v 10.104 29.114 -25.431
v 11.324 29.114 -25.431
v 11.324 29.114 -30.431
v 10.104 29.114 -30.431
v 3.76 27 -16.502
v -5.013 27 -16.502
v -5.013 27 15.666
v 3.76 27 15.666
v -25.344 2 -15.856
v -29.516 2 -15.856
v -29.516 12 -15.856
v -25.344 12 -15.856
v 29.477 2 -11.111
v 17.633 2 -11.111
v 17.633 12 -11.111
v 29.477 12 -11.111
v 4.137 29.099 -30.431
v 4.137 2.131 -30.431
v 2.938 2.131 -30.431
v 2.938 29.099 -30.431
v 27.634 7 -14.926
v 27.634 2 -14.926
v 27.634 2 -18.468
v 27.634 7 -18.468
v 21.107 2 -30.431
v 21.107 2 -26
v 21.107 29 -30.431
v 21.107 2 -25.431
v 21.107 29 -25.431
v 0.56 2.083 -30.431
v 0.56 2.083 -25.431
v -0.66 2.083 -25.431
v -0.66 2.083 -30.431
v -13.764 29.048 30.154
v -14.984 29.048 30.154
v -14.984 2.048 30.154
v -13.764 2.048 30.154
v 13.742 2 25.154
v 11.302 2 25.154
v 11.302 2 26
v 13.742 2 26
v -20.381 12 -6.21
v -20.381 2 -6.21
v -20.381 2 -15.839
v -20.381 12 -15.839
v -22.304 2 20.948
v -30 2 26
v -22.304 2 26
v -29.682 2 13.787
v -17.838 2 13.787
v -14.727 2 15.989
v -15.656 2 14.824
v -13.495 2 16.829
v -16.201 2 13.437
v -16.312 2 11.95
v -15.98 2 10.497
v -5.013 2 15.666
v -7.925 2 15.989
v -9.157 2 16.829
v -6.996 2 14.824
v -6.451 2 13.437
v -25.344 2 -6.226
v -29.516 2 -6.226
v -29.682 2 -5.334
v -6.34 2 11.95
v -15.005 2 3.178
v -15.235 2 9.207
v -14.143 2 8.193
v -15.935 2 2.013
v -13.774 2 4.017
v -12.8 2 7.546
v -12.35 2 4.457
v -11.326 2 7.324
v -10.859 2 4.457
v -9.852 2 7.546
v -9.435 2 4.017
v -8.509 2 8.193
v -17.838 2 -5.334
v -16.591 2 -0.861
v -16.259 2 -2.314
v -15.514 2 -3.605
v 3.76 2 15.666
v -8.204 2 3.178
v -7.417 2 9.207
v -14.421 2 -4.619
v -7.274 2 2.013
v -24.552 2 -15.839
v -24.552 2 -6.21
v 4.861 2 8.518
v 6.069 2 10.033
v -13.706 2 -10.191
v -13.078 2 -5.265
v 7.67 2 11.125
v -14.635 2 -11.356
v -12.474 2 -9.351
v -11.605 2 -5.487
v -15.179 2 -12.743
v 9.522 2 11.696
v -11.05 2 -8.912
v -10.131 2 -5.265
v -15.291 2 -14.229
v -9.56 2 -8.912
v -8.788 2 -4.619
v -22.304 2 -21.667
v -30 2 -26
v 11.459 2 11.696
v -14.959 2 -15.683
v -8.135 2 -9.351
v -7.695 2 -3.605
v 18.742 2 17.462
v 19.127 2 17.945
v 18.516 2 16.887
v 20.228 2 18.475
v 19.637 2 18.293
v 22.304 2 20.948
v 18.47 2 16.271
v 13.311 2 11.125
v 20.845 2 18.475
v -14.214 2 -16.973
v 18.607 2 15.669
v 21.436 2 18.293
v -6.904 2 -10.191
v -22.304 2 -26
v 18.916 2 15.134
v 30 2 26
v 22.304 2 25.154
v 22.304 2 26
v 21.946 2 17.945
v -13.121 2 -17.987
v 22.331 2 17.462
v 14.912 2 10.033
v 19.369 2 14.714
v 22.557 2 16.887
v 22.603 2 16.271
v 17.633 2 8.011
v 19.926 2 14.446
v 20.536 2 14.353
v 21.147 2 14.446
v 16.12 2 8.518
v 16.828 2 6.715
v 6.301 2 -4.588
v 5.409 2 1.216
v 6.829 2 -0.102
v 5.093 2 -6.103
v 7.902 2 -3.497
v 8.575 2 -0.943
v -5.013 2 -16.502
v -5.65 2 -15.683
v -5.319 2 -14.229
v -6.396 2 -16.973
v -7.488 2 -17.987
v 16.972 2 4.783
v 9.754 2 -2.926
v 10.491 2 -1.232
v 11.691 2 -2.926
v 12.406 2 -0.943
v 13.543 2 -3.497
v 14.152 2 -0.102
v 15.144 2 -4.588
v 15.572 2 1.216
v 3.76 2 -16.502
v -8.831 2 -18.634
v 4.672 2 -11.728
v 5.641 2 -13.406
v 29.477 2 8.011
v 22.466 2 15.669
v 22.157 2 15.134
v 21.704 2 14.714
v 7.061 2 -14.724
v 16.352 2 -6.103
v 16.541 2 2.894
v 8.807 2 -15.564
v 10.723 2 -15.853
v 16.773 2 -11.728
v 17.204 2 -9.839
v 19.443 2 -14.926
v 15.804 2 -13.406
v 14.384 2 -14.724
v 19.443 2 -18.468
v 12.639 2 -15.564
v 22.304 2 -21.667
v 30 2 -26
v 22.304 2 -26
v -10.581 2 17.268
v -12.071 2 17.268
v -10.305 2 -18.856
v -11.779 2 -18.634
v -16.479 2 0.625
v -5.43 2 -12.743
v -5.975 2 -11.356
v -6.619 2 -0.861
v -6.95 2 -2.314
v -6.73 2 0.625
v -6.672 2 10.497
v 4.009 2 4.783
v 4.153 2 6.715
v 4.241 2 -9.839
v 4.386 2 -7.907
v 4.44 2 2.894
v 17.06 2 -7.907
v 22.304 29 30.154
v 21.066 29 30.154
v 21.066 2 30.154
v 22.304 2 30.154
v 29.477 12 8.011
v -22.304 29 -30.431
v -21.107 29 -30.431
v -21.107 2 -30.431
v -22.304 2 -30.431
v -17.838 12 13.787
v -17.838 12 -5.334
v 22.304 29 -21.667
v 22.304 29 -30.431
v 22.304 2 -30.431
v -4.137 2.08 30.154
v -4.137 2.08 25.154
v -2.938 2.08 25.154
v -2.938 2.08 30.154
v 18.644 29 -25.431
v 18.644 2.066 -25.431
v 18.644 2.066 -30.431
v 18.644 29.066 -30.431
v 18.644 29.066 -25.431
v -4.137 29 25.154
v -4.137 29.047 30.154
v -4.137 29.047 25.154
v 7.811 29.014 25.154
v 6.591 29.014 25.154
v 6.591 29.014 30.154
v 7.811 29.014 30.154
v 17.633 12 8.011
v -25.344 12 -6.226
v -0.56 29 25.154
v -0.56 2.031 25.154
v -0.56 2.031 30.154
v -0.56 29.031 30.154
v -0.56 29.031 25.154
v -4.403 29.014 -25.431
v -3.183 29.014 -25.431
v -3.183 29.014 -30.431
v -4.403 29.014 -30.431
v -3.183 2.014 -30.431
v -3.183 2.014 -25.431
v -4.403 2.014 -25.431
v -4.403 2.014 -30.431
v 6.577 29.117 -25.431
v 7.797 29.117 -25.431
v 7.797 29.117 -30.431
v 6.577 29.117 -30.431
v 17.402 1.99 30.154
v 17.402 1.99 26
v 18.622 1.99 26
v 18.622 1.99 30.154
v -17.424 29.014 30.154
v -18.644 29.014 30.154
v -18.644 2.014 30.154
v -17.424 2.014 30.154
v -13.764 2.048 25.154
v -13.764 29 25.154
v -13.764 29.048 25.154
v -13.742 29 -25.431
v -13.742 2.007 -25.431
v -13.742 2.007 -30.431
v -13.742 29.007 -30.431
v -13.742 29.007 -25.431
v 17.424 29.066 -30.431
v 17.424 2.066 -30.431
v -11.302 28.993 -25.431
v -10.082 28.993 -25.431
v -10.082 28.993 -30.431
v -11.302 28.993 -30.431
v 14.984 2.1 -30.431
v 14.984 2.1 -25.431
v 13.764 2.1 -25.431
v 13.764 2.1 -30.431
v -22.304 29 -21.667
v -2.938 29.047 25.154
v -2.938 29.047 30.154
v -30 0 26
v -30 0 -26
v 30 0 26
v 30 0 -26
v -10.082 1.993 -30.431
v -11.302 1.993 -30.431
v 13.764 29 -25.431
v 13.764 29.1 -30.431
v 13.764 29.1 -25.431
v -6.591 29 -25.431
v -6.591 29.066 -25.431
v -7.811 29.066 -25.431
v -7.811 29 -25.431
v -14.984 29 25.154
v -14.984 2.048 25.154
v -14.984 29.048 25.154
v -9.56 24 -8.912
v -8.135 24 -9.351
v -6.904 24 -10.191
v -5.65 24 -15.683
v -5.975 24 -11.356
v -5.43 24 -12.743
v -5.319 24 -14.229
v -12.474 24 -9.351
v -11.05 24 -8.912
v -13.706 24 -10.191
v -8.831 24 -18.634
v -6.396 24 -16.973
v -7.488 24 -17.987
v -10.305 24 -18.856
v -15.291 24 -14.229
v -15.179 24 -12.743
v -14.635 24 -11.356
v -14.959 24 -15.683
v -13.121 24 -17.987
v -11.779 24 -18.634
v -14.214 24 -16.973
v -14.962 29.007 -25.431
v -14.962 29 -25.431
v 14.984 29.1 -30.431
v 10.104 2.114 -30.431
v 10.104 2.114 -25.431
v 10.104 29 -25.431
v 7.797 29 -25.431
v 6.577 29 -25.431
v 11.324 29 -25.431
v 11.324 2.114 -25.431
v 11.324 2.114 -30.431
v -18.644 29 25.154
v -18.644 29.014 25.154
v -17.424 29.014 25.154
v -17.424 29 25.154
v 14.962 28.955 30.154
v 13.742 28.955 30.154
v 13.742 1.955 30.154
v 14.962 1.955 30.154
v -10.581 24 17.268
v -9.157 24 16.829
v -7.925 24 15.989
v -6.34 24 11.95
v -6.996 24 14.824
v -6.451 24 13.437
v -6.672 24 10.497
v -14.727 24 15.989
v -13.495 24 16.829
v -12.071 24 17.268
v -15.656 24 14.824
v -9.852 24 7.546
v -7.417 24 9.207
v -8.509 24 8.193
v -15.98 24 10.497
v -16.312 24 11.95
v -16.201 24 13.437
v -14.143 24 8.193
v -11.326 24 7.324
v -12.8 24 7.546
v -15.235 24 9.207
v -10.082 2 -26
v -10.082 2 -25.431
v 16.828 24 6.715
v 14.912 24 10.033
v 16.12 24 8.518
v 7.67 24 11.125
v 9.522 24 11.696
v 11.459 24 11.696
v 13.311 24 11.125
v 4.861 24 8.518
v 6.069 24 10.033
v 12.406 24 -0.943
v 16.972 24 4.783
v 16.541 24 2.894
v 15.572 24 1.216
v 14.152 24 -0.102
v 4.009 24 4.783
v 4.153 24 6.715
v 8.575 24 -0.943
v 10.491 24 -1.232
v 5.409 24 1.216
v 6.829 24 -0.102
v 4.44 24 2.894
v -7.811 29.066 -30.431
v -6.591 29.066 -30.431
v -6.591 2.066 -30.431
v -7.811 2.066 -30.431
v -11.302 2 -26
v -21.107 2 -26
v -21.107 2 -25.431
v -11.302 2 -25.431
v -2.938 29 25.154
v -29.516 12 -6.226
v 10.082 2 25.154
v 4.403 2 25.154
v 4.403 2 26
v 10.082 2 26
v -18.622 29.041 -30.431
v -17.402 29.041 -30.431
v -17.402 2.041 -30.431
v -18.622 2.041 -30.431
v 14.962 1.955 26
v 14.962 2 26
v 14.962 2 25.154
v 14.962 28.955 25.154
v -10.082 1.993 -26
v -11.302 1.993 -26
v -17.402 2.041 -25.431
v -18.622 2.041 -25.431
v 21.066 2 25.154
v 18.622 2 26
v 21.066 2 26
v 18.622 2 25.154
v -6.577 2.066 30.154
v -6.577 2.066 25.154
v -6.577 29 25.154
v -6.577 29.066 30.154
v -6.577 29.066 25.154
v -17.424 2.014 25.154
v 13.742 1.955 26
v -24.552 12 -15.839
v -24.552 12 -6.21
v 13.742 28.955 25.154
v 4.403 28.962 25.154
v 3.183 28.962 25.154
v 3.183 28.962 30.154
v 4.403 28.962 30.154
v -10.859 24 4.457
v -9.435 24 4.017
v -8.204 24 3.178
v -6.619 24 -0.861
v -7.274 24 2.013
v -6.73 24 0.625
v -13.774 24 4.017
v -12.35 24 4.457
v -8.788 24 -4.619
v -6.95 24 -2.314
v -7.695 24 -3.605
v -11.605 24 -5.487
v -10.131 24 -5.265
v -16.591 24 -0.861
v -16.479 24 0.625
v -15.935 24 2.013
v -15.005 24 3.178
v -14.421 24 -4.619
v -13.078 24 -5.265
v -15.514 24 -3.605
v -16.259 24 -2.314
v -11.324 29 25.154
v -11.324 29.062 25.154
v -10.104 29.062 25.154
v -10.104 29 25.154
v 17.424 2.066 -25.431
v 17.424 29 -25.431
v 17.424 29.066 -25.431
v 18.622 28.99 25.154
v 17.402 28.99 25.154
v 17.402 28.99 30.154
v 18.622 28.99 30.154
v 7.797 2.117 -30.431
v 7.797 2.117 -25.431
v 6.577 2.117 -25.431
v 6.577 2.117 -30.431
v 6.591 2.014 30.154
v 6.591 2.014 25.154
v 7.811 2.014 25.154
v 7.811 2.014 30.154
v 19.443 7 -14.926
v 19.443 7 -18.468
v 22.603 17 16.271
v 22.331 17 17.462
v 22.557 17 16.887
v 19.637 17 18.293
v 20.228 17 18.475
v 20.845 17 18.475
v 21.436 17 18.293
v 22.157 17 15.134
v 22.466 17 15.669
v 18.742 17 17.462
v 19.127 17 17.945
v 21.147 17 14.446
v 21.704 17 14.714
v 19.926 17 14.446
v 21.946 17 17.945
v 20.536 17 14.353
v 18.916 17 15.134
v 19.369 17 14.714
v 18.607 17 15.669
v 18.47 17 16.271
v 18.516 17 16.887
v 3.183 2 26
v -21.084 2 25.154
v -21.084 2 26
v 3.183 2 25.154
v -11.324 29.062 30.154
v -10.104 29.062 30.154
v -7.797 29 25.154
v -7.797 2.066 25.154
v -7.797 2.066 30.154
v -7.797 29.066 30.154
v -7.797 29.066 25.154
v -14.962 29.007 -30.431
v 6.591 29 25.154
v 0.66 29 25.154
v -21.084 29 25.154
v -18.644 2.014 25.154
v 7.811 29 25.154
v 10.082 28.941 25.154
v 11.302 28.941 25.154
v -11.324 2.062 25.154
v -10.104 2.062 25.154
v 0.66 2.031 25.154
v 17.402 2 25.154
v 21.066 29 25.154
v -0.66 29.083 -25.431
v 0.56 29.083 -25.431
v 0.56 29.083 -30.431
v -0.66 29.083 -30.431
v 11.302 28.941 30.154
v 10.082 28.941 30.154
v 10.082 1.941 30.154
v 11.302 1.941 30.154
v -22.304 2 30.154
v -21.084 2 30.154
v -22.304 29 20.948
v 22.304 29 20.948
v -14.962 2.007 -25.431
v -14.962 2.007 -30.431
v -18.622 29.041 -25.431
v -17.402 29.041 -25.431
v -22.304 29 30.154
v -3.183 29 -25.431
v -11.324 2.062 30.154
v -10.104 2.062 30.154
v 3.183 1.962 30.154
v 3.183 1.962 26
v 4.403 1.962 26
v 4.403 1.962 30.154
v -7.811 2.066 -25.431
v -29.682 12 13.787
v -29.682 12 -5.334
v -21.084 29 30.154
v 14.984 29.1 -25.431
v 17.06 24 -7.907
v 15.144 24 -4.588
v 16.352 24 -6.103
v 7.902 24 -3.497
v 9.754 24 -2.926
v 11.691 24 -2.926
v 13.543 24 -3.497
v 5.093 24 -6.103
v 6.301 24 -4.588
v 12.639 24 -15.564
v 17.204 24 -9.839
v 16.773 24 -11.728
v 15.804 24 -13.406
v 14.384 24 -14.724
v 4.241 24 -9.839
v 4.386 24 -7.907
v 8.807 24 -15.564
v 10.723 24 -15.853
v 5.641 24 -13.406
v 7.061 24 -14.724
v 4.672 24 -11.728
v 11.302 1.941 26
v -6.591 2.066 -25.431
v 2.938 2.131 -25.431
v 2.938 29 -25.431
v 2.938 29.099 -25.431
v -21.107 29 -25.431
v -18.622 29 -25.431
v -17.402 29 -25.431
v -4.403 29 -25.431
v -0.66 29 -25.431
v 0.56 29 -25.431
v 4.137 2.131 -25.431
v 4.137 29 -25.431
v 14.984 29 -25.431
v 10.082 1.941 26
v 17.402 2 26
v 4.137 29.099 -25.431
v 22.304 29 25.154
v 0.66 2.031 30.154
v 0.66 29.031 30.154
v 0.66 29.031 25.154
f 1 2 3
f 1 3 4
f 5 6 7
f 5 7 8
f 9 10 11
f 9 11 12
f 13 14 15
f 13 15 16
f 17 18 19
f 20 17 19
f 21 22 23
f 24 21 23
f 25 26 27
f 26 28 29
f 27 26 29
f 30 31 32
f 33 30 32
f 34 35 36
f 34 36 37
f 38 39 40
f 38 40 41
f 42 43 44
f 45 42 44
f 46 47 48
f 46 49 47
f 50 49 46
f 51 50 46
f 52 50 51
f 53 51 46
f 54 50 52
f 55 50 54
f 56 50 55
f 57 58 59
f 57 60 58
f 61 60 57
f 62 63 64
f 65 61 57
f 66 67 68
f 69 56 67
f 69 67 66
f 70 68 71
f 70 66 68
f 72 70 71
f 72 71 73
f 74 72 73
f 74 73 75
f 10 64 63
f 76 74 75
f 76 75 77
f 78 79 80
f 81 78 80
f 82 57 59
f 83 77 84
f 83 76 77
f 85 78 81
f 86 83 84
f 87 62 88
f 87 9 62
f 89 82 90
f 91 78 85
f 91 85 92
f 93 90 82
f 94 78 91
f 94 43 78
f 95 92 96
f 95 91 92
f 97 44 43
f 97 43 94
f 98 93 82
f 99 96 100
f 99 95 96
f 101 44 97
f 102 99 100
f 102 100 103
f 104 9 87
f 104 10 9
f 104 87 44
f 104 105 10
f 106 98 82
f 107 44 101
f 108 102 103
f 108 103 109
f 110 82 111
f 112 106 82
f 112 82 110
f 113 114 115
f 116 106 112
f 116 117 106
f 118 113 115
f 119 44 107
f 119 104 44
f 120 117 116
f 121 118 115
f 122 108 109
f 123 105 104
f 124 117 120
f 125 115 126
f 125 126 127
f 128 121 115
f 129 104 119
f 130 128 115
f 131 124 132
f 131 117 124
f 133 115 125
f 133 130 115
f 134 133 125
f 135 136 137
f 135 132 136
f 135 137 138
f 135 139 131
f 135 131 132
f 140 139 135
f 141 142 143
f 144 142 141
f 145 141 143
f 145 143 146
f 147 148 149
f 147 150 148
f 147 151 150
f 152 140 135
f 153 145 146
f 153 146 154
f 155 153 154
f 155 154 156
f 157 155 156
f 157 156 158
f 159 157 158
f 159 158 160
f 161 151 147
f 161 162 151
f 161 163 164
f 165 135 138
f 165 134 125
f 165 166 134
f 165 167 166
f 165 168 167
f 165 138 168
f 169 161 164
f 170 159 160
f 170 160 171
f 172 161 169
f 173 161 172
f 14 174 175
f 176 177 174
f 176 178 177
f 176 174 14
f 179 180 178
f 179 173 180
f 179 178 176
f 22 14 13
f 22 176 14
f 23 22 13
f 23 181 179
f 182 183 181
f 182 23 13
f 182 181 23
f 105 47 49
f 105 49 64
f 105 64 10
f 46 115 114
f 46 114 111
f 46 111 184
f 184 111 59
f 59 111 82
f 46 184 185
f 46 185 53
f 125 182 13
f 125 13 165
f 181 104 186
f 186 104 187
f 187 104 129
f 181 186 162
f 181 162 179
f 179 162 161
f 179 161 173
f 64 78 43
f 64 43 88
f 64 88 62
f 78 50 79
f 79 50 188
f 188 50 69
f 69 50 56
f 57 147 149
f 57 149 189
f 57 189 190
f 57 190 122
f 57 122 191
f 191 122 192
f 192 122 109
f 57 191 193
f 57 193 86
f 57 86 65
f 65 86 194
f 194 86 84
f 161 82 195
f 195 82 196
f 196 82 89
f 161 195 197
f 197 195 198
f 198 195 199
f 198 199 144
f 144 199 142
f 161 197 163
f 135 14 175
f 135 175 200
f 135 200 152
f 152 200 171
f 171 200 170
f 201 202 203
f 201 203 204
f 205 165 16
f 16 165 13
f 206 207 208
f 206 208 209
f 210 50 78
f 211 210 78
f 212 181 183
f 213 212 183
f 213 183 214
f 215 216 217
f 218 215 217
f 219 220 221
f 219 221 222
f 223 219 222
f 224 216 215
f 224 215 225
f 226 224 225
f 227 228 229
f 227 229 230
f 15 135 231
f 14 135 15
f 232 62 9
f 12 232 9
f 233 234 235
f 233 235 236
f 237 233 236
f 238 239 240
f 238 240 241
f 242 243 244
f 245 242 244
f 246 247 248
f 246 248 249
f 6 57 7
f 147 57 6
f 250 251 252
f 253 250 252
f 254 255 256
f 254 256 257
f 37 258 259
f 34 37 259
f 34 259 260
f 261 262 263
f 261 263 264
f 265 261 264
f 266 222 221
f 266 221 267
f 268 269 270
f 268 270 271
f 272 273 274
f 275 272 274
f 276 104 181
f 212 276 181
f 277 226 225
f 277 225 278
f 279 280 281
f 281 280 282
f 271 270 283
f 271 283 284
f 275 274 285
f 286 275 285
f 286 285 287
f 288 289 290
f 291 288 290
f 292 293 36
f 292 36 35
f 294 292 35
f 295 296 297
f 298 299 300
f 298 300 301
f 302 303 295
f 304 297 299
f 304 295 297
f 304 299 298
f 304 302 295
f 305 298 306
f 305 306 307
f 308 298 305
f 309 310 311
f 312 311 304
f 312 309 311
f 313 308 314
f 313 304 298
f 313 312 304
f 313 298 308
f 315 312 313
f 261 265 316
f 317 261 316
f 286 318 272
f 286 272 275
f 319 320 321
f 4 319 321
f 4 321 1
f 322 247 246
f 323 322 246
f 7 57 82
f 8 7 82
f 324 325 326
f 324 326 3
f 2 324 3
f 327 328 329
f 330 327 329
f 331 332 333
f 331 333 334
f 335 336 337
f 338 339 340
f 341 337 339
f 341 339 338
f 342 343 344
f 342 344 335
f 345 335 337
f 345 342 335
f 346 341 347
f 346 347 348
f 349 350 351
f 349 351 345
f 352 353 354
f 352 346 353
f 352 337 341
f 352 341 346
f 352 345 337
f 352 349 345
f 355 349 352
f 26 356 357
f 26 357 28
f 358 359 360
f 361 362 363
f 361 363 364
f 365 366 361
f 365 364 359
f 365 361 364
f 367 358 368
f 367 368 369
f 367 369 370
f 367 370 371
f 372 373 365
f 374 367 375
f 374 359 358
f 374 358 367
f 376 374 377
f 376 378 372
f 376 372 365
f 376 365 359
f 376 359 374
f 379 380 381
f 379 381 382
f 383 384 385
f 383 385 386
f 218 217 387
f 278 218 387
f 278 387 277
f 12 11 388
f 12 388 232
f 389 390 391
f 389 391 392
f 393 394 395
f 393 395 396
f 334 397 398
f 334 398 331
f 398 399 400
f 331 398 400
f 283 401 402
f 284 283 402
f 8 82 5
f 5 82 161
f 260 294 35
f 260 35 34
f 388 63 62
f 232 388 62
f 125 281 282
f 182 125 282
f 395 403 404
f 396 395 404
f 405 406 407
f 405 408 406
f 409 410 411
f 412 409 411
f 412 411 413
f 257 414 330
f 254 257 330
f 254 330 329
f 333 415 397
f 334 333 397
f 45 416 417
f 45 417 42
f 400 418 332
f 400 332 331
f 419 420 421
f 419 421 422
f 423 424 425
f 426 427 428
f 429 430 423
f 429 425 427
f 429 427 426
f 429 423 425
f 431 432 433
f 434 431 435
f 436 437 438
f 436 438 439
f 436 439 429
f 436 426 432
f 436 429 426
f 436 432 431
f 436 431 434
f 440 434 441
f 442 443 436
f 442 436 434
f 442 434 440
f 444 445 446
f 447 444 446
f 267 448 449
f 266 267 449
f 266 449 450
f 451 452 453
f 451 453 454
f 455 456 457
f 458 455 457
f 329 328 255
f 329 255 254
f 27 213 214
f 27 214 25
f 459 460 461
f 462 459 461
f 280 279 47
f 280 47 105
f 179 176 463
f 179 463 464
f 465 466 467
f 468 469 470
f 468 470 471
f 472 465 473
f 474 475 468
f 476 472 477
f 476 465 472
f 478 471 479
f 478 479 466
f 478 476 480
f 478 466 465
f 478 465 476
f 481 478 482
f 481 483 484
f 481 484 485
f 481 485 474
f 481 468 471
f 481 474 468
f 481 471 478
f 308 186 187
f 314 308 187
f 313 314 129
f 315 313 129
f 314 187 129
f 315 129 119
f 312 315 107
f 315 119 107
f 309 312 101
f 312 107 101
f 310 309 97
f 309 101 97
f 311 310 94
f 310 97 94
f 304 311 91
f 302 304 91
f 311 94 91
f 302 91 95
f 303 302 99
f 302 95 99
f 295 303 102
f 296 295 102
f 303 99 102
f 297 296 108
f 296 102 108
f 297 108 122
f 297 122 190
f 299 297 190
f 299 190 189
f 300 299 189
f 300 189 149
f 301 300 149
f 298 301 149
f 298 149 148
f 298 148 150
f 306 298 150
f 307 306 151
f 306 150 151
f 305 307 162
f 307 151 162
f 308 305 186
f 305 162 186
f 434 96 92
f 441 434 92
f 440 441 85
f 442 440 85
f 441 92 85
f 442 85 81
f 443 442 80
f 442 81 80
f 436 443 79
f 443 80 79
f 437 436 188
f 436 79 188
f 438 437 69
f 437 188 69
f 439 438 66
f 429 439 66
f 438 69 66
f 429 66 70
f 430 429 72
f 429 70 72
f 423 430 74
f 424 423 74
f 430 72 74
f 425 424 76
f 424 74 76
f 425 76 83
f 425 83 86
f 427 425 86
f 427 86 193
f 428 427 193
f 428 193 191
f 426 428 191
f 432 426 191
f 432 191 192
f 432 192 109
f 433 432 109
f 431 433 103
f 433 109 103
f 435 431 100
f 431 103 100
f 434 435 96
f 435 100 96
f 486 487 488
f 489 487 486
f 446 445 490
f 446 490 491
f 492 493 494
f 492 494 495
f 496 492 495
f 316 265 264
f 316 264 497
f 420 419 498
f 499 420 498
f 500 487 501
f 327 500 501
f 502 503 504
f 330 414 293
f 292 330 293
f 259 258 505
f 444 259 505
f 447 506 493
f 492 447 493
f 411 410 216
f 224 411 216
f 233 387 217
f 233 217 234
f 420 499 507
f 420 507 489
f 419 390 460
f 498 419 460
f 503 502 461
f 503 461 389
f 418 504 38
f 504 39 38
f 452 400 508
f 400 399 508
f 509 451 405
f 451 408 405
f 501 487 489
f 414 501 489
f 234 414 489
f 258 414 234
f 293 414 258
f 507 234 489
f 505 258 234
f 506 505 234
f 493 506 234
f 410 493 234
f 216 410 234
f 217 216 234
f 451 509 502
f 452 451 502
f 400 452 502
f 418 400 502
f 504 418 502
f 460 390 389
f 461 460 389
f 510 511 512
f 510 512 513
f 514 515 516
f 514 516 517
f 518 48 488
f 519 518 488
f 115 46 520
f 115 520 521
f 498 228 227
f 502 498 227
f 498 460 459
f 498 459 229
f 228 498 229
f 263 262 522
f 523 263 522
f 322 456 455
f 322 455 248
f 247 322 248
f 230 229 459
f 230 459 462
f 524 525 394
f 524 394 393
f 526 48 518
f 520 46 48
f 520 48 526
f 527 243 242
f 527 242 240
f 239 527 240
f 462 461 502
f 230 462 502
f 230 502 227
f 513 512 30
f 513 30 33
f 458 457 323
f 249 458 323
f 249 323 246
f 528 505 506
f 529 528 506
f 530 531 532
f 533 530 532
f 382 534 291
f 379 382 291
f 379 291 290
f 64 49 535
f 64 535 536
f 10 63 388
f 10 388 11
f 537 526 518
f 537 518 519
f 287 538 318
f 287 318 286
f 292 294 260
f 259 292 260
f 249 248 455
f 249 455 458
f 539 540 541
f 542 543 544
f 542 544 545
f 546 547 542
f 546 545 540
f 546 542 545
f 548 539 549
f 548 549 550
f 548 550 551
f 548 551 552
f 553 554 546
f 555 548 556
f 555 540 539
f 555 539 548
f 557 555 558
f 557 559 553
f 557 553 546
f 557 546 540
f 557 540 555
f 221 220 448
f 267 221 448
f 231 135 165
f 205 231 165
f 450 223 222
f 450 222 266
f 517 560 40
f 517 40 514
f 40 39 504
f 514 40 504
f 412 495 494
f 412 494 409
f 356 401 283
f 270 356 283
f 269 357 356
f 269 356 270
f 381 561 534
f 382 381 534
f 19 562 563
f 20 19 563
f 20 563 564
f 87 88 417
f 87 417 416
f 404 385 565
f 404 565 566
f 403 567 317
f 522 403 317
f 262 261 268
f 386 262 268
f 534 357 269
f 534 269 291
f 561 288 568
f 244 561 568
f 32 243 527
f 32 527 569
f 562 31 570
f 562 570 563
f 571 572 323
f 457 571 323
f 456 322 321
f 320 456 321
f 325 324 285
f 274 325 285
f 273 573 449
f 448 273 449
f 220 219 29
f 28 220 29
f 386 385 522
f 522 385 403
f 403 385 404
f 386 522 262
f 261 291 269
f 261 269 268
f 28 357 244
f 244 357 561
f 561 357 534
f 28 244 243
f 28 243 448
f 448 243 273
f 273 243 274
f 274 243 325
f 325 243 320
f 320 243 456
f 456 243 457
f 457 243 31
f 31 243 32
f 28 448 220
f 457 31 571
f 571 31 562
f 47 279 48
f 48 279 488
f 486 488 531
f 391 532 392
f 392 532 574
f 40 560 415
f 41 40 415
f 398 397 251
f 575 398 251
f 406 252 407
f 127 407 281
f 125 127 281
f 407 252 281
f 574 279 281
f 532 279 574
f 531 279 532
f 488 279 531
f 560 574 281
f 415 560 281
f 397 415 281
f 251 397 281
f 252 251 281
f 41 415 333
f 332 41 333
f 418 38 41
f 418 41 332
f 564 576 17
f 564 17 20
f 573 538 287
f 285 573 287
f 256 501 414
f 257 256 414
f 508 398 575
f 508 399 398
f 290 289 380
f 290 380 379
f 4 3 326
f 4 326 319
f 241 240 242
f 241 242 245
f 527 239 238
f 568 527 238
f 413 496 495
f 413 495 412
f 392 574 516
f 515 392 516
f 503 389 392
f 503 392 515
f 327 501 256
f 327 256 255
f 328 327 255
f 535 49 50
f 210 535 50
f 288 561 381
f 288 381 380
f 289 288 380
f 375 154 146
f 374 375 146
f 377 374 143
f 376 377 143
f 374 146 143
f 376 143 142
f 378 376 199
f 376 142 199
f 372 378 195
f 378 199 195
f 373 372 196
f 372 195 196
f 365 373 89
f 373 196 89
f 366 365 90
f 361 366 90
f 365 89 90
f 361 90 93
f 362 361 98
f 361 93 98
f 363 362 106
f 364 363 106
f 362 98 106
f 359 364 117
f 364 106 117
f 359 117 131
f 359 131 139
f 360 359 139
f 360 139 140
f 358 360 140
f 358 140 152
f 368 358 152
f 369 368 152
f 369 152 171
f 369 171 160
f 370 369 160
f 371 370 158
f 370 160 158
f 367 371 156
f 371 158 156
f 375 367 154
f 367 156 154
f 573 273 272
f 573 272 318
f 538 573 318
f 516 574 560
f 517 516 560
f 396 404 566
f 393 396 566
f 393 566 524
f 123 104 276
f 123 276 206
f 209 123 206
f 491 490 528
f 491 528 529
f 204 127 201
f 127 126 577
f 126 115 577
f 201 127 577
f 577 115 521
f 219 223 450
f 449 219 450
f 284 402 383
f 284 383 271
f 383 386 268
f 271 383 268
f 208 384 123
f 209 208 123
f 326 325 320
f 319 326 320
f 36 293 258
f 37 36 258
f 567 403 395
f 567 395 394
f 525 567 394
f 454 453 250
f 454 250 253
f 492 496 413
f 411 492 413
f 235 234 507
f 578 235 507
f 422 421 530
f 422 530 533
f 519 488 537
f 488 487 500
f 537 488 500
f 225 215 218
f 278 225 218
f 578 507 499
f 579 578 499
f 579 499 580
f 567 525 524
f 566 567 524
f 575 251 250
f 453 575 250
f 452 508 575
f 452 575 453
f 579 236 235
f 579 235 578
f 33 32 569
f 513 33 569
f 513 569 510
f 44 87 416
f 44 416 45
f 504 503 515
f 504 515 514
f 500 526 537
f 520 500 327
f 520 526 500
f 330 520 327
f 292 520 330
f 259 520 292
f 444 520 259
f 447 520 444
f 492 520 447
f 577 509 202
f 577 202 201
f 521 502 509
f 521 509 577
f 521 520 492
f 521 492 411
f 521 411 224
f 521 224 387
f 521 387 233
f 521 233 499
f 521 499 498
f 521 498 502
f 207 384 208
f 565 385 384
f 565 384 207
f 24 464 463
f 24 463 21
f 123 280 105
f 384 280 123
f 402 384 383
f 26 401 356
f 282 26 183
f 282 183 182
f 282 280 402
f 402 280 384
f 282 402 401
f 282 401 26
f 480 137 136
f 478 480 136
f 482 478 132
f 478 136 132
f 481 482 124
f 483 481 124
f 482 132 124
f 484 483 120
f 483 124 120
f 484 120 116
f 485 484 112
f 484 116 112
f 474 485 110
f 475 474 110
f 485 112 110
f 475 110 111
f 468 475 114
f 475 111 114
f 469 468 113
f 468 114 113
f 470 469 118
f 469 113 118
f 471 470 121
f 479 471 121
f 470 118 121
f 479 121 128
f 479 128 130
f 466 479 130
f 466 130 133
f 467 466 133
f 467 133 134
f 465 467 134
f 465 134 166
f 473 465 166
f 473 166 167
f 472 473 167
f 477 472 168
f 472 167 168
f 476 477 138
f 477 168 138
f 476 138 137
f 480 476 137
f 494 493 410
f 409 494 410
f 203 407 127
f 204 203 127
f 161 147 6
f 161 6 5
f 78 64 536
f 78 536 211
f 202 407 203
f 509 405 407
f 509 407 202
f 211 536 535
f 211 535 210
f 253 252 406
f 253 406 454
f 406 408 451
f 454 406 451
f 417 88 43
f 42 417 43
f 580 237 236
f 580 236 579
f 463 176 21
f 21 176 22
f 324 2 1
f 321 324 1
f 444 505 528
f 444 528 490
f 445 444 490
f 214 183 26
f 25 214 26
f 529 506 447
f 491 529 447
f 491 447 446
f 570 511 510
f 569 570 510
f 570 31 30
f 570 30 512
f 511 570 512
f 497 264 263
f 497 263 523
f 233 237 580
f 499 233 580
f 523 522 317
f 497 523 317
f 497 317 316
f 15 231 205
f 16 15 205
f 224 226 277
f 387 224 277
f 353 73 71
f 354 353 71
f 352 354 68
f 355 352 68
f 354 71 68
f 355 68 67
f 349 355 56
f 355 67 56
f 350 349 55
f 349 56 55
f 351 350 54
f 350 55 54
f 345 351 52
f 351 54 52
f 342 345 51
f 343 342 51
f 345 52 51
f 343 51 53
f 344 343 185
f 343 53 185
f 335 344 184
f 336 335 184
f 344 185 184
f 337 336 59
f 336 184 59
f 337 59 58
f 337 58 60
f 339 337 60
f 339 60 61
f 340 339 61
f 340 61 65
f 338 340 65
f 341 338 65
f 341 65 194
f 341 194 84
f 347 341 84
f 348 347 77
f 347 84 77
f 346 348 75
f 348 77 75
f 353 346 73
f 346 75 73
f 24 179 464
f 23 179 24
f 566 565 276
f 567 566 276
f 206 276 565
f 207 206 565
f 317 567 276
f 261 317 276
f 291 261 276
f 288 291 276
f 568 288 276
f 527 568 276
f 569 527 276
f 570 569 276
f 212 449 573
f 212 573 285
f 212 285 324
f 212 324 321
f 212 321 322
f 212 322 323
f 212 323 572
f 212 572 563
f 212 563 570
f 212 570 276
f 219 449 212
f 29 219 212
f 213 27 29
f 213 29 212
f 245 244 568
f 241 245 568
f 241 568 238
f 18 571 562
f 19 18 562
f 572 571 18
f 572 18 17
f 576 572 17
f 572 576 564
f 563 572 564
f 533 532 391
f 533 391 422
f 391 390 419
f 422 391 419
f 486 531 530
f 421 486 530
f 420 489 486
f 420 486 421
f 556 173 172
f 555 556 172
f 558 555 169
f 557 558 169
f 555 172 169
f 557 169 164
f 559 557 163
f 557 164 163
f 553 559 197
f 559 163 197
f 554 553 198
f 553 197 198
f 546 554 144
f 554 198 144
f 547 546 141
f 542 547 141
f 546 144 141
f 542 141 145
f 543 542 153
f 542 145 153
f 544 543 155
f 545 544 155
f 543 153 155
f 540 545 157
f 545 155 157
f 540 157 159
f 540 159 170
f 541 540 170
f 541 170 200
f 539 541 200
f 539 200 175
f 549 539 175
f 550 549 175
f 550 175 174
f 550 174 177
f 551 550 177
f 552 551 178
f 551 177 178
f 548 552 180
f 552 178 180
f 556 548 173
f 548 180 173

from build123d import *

# Parameters (mm, degrees)
SKIZZE1_W                        = 60
SKIZZE1_H                        = 52
AUFSATZ_LINEAR_AUSTRAGEN1_DEPTH  = 2
SKIZZE2_W                        = 4.171328817
SKIZZE2_H                        = 9.629375294
SKIZZE2_H_2                      = 9.629375295
AUFSATZ_LINEAR_AUSTRAGEN2_DEPTH  = 10
SKIZZE3_W                        = 11.843772269
SKIZZE3_H                        = 19.121604294
SKIZZE3_H_2                      = 19.121604293
AUFSATZ_LINEAR_AUSTRAGEN3_DEPTH  = 10
SKIZZE4_R                        = 2.072288809
AUFSATZ_LINEAR_AUSTRAGEN4_DEPTH  = 15
SKIZZE5_W                        = 8.191020073
SKIZZE5_H                        = 3.542062735
AUFSATZ_LINEAR_AUSTRAGEN5_DEPTH  = 5
SKIZZE6_W                        = 44.607852562
SKIZZE6_H                        = 3.763441655
SKIZZE6_H_2                      = 4.206199497
AUFSATZ_LINEAR_AUSTRAGEN6_DEPTH  = 27
SKIZZE7_R                        = 5
SKIZZE7_R_2                      = 6.5
AUFSATZ_LINEAR_AUSTRAGEN7_DEPTH  = 22
SKIZZE8_W                        = 8.773032398
SKIZZE8_H                        = 32.167785459
AUFSATZ_LINEAR_AUSTRAGEN8_DEPTH  = 25
SKIZZE9_W                        = 1.22
SKIZZE9_H                        = 27
SKIZZE9_W_2                      = 1.198395349
SKIZZE9_H_2                      = 26.967916188
SKIZZE9_W_3                      = 1.238034023
AUFSATZ_LINEAR_AUSTRAGEN9_DEPTH  = 5
SKIZZE10_W                       = 1.22
SKIZZE10_H                       = 27
SKIZZE10_W_2                     = 1.198395349
SKIZZE10_H_2                     = 26.967916188
SKIZZE10_W_3                     = 1.196647202
AUFSATZ_LINEAR_AUSTRAGEN10_DEPTH = 5


with BuildPart() as part:
    # Skizze1 → Aufsatz-Linear austragen1 (new body)
    with BuildSketch(Plane(origin=(0, 0, 0), x_dir=(1, 0, 0), z_dir=(0, 1, 0))):
        Rectangle(SKIZZE1_W, SKIZZE1_H)
    extrude(amount=AUFSATZ_LINEAR_AUSTRAGEN1_DEPTH)

    # Skizze2 → Aufsatz-Linear austragen2 (add)
    with BuildSketch(Plane(origin=(0, 2, 0), x_dir=(1, 0, 0), z_dir=(0, 1, 0))):
        with Locations((-27.429980224, 11.040969798)):
            Rectangle(SKIZZE2_W, SKIZZE2_H)
        with Locations((-22.466389845, 11.024313198)):
            Rectangle(SKIZZE2_W, SKIZZE2_H_2)
    extrude(amount=AUFSATZ_LINEAR_AUSTRAGEN2_DEPTH)

    # Skizze3 → Aufsatz-Linear austragen3 (add)
    with BuildSketch(Plane(origin=(0, 2, 0), x_dir=(1, 0, 0), z_dir=(0, 1, 0))):
        with Locations((23.554785505, 1.549851865)):
            Rectangle(SKIZZE3_W, SKIZZE3_H)
        with Locations((-23.759716727, -4.226654643)):
            Rectangle(SKIZZE3_W, SKIZZE3_H_2)
    extrude(amount=AUFSATZ_LINEAR_AUSTRAGEN3_DEPTH)

    # Skizze4 → Aufsatz-Linear austragen4 (add)
    with BuildSketch(Plane(origin=(0, 2, 0), x_dir=(1, 0, 0), z_dir=(0, 1, 0))):
        with Locations(Location((20.536465542, -16.425780337, 0), (0, 0, 90))):
            Circle(SKIZZE4_R)
    extrude(amount=AUFSATZ_LINEAR_AUSTRAGEN4_DEPTH)

    # Skizze5 → Aufsatz-Linear austragen5 (add)
    with BuildSketch(Plane(origin=(0, 2, 0), x_dir=(1, 0, 0), z_dir=(0, 1, 0))):
        with Locations((23.538626636, 16.697381153)):
            Rectangle(SKIZZE5_W, SKIZZE5_H)
    extrude(amount=AUFSATZ_LINEAR_AUSTRAGEN5_DEPTH)

    # Skizze6 → Aufsatz-Linear austragen6 (add)
    with BuildSketch(Plane(origin=(0, 2, 0), x_dir=(1, 0, 0), z_dir=(0, 1, 0))):
        with Locations((0, 23.549182712)):
            Rectangle(SKIZZE6_W, SKIZZE6_H)
        with Locations((0, -23.05108014)):
            Rectangle(SKIZZE6_W, SKIZZE6_H_2)
    extrude(amount=AUFSATZ_LINEAR_AUSTRAGEN6_DEPTH)

    # Skizze7 → Aufsatz-Linear austragen7 (add)
    with BuildSketch(Plane(origin=(0, 2, 0), x_dir=(1, 0, 0), z_dir=(0, 1, 0))):
        with Locations(Location((-11.604540209, 0.487390689, 0), (0, 0, 90))):
            Circle(SKIZZE7_R)
        with Locations(Location((-10.304831705, 13.855821009, 0), (0, 0, 90))):
            Circle(SKIZZE7_R)
        with Locations(Location((-11.326031244, -12.324021702, 0), (0, 0, 90))):
            Circle(SKIZZE7_R)
        with Locations(Location((10.722595153, 9.353259408, 0), (0, 0, 90))):
            Circle(SKIZZE7_R_2)
        with Locations(Location((10.490504349, -5.268461255, 0), (0, 0, 90))):
            Circle(SKIZZE7_R_2)
    extrude(amount=AUFSATZ_LINEAR_AUSTRAGEN7_DEPTH)

    # Skizze8 → Aufsatz-Linear austragen8 (add)
    with BuildSketch(Plane(origin=(0, 2, 0), x_dir=(1, 0, 0), z_dir=(0, 1, 0))):
        with Locations((-0.626645171, 0.417763447)):
            Rectangle(SKIZZE8_W, SKIZZE8_H)
    extrude(amount=AUFSATZ_LINEAR_AUSTRAGEN8_DEPTH)

    # Skizze9 → Aufsatz-Linear austragen9 (add)
    with BuildSketch(Plane.XY.offset(25.154179888)):
        with Locations((-21.693926281, 15.5)):
            Rectangle(SKIZZE9_W, SKIZZE9_H)
        with Locations((-18.033926281, 15.513977132)):
            Rectangle(SKIZZE9_W, SKIZZE9_H)
        with Locations((-14.373926281, 15.548375388)):
            Rectangle(SKIZZE9_W, SKIZZE9_H)
        with Locations((-10.713926281, 15.56235252)):
            Rectangle(SKIZZE9_W, SKIZZE9_H)
        with Locations((-7.186859691, 15.565574516)):
            Rectangle(SKIZZE9_W, SKIZZE9_H)
        with Locations((-3.537662017, 15.563509742)):
            Rectangle(SKIZZE9_W_2, SKIZZE9_H_2)
        with Locations((0.050366666, 15.53117626)):
            Rectangle(SKIZZE9_W, SKIZZE9_H)
        with Locations((3.793140309, 15.462379749)):
            Rectangle(SKIZZE9_W, SKIZZE9_H)
        with Locations((10.692247294, 15.44141405)):
            Rectangle(SKIZZE9_W, SKIZZE9_H)
        with Locations((14.352247294, 15.455391183)):
            Rectangle(SKIZZE9_W, SKIZZE9_H)
        with Locations((18.012247294, 15.489789438)):
            Rectangle(SKIZZE9_W, SKIZZE9_H)
        with Locations((7.20130698, 15.513977132)):
            Rectangle(SKIZZE9_W, SKIZZE9_H)
        with Locations((21.68490927, 15.5)):
            Rectangle(SKIZZE9_W_3, SKIZZE9_H)
    extrude(amount=AUFSATZ_LINEAR_AUSTRAGEN9_DEPTH)

    # Skizze10 → Aufsatz-Linear austragen10 (add)
    with BuildSketch(Plane(origin=(0, 0, -25.430903539), x_dir=(-1, 0, 0), z_dir=(0, 0, -1))):
        with Locations((-18.033926281, 15.565538052)):
            Rectangle(SKIZZE10_W, SKIZZE10_H)
        with Locations((-14.373926281, 15.599936307)):
            Rectangle(SKIZZE10_W, SKIZZE10_H)
        with Locations((-10.713926281, 15.61391344)):
            Rectangle(SKIZZE10_W, SKIZZE10_H)
        with Locations((-7.186859691, 15.617135435)):
            Rectangle(SKIZZE10_W, SKIZZE10_H)
        with Locations((-3.537662017, 15.615070662)):
            Rectangle(SKIZZE10_W_2, SKIZZE10_H_2)
        with Locations((0.050366666, 15.58273718)):
            Rectangle(SKIZZE10_W, SKIZZE10_H)
        with Locations((3.793140309, 15.513940668)):
            Rectangle(SKIZZE10_W, SKIZZE10_H)
        with Locations((10.692247294, 15.49297497)):
            Rectangle(SKIZZE10_W, SKIZZE10_H)
        with Locations((14.352247294, 15.506952102)):
            Rectangle(SKIZZE10_W, SKIZZE10_H)
        with Locations((18.012247294, 15.541350358)):
            Rectangle(SKIZZE10_W, SKIZZE10_H)
        with Locations((7.20130698, 15.565538052)):
            Rectangle(SKIZZE10_W, SKIZZE10_H)
        with Locations((-21.70560268, 15.5)):
            Rectangle(SKIZZE10_W_3, SKIZZE10_H)
        with Locations((21.70560268, 15.5)):
            Rectangle(SKIZZE10_W_3, SKIZZE10_H)
    extrude(amount=AUFSATZ_LINEAR_AUSTRAGEN10_DEPTH)


solid = part.part
